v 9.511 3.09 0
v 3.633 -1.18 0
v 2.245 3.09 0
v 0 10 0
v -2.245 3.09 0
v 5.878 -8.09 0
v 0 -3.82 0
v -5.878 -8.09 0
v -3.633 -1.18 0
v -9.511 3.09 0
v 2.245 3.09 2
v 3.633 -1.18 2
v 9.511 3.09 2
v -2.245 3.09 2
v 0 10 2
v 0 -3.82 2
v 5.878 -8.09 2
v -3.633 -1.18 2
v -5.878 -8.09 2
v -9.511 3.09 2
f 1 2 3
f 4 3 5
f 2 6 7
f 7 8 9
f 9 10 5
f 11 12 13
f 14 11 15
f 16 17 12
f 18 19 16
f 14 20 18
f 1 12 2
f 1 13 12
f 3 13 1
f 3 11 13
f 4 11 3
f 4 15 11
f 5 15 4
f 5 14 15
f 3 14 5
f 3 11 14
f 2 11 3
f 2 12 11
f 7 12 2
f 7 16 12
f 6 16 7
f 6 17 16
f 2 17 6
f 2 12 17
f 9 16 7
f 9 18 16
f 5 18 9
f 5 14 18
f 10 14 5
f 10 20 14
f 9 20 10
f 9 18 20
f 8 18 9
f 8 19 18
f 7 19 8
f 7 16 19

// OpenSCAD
// a pentagram is filled even-odd: the centre is hollow (splitting it at the crossings and filling by nesting
// would fill it). Alone in its file for the same CGAL reason as polygon-bowtie.scad.
linear_extrude(2) polygon([for (i = [0:4]) 10 * [cos(90 + i * 144), sin(90 + i * 144)]]);
